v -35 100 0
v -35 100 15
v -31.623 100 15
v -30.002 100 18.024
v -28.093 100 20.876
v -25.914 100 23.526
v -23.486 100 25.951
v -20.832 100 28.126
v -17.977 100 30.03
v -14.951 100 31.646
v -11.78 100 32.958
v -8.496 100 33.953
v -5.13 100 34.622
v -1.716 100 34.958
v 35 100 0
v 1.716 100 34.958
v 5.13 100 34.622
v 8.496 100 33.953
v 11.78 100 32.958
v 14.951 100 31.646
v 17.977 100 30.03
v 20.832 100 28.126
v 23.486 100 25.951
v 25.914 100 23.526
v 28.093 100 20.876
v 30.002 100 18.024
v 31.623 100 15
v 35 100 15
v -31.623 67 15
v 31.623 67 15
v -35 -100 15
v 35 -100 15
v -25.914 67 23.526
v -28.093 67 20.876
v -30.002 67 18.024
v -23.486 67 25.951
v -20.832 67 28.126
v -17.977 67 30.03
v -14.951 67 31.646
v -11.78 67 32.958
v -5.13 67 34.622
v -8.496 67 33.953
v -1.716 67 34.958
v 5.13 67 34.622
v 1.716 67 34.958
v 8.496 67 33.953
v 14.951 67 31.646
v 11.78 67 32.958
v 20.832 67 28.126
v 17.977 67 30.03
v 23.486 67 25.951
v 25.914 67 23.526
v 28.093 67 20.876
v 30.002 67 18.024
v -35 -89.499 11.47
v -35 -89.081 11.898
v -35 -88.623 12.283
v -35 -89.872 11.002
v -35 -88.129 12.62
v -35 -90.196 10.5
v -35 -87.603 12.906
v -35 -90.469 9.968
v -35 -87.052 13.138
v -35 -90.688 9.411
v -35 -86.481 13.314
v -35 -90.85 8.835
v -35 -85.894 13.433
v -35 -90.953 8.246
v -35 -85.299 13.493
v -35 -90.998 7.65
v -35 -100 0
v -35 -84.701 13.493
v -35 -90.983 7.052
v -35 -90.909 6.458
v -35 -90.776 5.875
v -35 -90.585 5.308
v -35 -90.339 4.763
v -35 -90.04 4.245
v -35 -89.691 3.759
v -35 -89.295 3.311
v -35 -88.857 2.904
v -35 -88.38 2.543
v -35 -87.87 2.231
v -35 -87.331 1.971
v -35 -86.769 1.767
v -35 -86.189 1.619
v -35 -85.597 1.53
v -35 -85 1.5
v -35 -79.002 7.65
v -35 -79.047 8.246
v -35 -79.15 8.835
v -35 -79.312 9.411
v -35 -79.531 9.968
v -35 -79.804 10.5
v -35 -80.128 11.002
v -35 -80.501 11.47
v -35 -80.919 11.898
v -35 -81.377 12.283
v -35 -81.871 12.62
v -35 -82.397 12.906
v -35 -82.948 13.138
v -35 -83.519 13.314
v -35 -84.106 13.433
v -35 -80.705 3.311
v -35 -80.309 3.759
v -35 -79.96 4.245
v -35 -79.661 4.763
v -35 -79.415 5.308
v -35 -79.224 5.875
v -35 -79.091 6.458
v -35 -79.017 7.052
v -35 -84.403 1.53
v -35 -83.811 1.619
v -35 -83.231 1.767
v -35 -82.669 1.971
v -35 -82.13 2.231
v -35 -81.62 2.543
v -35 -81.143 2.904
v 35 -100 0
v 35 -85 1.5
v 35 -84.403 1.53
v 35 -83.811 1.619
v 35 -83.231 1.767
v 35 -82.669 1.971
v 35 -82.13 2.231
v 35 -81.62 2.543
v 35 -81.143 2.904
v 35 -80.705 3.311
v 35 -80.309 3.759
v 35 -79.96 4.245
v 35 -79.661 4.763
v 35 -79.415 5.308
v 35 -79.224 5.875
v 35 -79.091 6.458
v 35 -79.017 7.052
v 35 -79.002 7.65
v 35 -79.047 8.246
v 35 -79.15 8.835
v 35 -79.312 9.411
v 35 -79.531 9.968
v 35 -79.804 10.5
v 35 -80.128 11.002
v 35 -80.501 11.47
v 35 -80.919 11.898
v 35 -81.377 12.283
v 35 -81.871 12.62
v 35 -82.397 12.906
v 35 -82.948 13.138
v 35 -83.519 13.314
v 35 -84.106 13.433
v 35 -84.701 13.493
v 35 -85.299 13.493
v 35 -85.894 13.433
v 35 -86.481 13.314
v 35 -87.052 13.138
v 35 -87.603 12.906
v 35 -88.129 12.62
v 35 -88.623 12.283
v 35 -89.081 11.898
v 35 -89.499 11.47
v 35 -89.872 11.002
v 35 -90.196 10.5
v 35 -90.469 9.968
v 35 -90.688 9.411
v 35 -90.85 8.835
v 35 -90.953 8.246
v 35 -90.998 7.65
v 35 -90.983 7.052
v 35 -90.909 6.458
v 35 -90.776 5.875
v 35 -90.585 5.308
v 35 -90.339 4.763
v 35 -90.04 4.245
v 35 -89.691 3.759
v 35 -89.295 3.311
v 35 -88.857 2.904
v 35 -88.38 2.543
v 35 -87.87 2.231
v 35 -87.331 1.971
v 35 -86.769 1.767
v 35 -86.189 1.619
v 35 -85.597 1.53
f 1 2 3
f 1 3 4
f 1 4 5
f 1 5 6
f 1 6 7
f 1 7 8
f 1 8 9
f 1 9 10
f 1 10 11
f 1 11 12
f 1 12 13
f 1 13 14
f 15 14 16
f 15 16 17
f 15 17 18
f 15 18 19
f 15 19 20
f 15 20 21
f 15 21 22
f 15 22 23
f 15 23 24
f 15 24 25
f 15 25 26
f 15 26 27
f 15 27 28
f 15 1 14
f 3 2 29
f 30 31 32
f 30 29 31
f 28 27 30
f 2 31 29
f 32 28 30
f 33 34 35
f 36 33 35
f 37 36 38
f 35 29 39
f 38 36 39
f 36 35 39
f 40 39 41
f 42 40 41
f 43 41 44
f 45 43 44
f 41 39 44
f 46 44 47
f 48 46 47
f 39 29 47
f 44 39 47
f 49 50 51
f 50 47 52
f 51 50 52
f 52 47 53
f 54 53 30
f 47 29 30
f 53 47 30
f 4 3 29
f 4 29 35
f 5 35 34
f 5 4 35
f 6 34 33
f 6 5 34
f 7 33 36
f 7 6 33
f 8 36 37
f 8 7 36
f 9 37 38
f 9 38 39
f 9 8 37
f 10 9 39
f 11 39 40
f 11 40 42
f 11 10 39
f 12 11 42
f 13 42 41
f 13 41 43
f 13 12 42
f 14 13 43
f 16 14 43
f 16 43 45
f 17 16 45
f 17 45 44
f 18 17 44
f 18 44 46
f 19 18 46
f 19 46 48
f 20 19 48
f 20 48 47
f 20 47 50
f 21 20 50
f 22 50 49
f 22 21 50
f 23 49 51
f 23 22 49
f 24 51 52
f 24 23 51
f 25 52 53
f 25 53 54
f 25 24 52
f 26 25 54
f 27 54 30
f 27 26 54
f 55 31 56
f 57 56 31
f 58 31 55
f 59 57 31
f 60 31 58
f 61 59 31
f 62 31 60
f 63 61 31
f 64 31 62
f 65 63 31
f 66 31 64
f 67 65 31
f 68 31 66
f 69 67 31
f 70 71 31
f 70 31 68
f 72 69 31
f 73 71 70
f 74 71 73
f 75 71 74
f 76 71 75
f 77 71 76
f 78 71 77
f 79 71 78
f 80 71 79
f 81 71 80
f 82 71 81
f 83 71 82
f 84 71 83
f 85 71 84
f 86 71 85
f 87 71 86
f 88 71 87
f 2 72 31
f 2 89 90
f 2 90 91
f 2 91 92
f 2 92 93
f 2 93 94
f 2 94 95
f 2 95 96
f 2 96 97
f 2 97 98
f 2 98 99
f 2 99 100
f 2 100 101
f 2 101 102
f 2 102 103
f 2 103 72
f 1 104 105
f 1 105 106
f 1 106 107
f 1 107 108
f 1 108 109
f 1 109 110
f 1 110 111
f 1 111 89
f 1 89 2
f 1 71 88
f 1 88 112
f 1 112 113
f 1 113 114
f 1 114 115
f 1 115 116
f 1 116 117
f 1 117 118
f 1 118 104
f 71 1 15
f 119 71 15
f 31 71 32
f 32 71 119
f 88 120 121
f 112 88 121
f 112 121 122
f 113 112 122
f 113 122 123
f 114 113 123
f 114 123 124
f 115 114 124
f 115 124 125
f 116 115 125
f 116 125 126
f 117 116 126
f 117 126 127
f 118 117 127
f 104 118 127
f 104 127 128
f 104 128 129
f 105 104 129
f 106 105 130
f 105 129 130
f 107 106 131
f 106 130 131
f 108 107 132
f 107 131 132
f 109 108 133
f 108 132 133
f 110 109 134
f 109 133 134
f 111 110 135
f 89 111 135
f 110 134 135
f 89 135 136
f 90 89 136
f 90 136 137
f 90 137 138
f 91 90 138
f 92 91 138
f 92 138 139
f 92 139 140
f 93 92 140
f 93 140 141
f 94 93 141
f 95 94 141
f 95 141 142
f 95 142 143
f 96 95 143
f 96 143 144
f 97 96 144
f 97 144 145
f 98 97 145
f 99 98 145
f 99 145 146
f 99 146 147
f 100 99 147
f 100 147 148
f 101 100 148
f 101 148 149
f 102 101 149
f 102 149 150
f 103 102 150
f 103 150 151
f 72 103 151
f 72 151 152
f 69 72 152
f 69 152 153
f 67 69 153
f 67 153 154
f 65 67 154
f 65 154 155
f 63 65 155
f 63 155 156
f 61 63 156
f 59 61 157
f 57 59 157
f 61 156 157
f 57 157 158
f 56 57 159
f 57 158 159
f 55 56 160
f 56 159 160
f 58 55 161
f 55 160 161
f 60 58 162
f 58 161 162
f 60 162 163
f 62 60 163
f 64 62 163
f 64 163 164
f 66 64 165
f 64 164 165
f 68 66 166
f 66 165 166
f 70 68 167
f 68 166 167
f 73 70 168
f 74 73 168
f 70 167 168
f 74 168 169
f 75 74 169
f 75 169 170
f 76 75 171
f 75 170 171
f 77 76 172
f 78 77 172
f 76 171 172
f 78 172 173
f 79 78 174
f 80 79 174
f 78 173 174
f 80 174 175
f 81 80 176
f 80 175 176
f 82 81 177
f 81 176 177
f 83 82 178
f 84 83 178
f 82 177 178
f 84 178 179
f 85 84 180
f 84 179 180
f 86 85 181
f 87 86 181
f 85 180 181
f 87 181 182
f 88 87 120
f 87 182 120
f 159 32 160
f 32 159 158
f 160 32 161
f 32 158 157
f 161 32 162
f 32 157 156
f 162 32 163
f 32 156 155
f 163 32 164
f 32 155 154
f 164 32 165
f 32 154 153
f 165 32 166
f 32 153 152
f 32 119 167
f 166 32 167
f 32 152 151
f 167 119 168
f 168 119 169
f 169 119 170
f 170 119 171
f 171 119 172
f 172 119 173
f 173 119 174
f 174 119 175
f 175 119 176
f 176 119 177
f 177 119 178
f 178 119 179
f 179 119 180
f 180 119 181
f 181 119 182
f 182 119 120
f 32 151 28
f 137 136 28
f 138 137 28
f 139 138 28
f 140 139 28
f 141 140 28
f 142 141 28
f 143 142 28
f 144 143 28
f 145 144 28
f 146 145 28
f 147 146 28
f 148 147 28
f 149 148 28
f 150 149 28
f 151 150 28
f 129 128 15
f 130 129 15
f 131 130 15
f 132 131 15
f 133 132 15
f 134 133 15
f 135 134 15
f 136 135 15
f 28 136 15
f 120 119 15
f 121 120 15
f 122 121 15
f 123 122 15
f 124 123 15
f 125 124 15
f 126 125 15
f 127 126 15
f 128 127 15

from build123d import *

# Parameters (mm, degrees)
SKETCH1_W           = 70
SKETCH1_H           = 200
BOSS_EXTRUDE4_DEPTH = 15
SKETCH9_R           = 6
CUT_EXTRUDE1_DEPTH  = 71
BOSS_EXTRUDE5_DEPTH = 33


with BuildPart() as part:
    # Sketch1 → Boss-Extrude4 (new body)
    with BuildSketch(Plane.XY):
        Rectangle(SKETCH1_W, SKETCH1_H)
    extrude(amount=BOSS_EXTRUDE4_DEPTH)

    # Sketch9 → Cut-Extrude1 (cut, through all)
    with BuildSketch(Plane(origin=(35, 0, 0), x_dir=(0, 0, -1), z_dir=(1, 0, 0))):
        with Locations((-7.5, -85)):
            Circle(SKETCH9_R)
    extrude(amount=-CUT_EXTRUDE1_DEPTH, mode=Mode.SUBTRACT)

    # Sketch10 → Boss-Extrude5 (add)
    with BuildSketch(Plane(origin=(0, 100, 0), x_dir=(1, 0, 0), z_dir=(0, 1, 0))):
        with BuildLine():
            Line((31.622776602, -15), (-31.622776602, -15))
            ThreePointArc((-31.622776602, -15), (0, -35), (31.622776602, -15))
        make_face()
    extrude(amount=-BOSS_EXTRUDE5_DEPTH)


solid = part.part
